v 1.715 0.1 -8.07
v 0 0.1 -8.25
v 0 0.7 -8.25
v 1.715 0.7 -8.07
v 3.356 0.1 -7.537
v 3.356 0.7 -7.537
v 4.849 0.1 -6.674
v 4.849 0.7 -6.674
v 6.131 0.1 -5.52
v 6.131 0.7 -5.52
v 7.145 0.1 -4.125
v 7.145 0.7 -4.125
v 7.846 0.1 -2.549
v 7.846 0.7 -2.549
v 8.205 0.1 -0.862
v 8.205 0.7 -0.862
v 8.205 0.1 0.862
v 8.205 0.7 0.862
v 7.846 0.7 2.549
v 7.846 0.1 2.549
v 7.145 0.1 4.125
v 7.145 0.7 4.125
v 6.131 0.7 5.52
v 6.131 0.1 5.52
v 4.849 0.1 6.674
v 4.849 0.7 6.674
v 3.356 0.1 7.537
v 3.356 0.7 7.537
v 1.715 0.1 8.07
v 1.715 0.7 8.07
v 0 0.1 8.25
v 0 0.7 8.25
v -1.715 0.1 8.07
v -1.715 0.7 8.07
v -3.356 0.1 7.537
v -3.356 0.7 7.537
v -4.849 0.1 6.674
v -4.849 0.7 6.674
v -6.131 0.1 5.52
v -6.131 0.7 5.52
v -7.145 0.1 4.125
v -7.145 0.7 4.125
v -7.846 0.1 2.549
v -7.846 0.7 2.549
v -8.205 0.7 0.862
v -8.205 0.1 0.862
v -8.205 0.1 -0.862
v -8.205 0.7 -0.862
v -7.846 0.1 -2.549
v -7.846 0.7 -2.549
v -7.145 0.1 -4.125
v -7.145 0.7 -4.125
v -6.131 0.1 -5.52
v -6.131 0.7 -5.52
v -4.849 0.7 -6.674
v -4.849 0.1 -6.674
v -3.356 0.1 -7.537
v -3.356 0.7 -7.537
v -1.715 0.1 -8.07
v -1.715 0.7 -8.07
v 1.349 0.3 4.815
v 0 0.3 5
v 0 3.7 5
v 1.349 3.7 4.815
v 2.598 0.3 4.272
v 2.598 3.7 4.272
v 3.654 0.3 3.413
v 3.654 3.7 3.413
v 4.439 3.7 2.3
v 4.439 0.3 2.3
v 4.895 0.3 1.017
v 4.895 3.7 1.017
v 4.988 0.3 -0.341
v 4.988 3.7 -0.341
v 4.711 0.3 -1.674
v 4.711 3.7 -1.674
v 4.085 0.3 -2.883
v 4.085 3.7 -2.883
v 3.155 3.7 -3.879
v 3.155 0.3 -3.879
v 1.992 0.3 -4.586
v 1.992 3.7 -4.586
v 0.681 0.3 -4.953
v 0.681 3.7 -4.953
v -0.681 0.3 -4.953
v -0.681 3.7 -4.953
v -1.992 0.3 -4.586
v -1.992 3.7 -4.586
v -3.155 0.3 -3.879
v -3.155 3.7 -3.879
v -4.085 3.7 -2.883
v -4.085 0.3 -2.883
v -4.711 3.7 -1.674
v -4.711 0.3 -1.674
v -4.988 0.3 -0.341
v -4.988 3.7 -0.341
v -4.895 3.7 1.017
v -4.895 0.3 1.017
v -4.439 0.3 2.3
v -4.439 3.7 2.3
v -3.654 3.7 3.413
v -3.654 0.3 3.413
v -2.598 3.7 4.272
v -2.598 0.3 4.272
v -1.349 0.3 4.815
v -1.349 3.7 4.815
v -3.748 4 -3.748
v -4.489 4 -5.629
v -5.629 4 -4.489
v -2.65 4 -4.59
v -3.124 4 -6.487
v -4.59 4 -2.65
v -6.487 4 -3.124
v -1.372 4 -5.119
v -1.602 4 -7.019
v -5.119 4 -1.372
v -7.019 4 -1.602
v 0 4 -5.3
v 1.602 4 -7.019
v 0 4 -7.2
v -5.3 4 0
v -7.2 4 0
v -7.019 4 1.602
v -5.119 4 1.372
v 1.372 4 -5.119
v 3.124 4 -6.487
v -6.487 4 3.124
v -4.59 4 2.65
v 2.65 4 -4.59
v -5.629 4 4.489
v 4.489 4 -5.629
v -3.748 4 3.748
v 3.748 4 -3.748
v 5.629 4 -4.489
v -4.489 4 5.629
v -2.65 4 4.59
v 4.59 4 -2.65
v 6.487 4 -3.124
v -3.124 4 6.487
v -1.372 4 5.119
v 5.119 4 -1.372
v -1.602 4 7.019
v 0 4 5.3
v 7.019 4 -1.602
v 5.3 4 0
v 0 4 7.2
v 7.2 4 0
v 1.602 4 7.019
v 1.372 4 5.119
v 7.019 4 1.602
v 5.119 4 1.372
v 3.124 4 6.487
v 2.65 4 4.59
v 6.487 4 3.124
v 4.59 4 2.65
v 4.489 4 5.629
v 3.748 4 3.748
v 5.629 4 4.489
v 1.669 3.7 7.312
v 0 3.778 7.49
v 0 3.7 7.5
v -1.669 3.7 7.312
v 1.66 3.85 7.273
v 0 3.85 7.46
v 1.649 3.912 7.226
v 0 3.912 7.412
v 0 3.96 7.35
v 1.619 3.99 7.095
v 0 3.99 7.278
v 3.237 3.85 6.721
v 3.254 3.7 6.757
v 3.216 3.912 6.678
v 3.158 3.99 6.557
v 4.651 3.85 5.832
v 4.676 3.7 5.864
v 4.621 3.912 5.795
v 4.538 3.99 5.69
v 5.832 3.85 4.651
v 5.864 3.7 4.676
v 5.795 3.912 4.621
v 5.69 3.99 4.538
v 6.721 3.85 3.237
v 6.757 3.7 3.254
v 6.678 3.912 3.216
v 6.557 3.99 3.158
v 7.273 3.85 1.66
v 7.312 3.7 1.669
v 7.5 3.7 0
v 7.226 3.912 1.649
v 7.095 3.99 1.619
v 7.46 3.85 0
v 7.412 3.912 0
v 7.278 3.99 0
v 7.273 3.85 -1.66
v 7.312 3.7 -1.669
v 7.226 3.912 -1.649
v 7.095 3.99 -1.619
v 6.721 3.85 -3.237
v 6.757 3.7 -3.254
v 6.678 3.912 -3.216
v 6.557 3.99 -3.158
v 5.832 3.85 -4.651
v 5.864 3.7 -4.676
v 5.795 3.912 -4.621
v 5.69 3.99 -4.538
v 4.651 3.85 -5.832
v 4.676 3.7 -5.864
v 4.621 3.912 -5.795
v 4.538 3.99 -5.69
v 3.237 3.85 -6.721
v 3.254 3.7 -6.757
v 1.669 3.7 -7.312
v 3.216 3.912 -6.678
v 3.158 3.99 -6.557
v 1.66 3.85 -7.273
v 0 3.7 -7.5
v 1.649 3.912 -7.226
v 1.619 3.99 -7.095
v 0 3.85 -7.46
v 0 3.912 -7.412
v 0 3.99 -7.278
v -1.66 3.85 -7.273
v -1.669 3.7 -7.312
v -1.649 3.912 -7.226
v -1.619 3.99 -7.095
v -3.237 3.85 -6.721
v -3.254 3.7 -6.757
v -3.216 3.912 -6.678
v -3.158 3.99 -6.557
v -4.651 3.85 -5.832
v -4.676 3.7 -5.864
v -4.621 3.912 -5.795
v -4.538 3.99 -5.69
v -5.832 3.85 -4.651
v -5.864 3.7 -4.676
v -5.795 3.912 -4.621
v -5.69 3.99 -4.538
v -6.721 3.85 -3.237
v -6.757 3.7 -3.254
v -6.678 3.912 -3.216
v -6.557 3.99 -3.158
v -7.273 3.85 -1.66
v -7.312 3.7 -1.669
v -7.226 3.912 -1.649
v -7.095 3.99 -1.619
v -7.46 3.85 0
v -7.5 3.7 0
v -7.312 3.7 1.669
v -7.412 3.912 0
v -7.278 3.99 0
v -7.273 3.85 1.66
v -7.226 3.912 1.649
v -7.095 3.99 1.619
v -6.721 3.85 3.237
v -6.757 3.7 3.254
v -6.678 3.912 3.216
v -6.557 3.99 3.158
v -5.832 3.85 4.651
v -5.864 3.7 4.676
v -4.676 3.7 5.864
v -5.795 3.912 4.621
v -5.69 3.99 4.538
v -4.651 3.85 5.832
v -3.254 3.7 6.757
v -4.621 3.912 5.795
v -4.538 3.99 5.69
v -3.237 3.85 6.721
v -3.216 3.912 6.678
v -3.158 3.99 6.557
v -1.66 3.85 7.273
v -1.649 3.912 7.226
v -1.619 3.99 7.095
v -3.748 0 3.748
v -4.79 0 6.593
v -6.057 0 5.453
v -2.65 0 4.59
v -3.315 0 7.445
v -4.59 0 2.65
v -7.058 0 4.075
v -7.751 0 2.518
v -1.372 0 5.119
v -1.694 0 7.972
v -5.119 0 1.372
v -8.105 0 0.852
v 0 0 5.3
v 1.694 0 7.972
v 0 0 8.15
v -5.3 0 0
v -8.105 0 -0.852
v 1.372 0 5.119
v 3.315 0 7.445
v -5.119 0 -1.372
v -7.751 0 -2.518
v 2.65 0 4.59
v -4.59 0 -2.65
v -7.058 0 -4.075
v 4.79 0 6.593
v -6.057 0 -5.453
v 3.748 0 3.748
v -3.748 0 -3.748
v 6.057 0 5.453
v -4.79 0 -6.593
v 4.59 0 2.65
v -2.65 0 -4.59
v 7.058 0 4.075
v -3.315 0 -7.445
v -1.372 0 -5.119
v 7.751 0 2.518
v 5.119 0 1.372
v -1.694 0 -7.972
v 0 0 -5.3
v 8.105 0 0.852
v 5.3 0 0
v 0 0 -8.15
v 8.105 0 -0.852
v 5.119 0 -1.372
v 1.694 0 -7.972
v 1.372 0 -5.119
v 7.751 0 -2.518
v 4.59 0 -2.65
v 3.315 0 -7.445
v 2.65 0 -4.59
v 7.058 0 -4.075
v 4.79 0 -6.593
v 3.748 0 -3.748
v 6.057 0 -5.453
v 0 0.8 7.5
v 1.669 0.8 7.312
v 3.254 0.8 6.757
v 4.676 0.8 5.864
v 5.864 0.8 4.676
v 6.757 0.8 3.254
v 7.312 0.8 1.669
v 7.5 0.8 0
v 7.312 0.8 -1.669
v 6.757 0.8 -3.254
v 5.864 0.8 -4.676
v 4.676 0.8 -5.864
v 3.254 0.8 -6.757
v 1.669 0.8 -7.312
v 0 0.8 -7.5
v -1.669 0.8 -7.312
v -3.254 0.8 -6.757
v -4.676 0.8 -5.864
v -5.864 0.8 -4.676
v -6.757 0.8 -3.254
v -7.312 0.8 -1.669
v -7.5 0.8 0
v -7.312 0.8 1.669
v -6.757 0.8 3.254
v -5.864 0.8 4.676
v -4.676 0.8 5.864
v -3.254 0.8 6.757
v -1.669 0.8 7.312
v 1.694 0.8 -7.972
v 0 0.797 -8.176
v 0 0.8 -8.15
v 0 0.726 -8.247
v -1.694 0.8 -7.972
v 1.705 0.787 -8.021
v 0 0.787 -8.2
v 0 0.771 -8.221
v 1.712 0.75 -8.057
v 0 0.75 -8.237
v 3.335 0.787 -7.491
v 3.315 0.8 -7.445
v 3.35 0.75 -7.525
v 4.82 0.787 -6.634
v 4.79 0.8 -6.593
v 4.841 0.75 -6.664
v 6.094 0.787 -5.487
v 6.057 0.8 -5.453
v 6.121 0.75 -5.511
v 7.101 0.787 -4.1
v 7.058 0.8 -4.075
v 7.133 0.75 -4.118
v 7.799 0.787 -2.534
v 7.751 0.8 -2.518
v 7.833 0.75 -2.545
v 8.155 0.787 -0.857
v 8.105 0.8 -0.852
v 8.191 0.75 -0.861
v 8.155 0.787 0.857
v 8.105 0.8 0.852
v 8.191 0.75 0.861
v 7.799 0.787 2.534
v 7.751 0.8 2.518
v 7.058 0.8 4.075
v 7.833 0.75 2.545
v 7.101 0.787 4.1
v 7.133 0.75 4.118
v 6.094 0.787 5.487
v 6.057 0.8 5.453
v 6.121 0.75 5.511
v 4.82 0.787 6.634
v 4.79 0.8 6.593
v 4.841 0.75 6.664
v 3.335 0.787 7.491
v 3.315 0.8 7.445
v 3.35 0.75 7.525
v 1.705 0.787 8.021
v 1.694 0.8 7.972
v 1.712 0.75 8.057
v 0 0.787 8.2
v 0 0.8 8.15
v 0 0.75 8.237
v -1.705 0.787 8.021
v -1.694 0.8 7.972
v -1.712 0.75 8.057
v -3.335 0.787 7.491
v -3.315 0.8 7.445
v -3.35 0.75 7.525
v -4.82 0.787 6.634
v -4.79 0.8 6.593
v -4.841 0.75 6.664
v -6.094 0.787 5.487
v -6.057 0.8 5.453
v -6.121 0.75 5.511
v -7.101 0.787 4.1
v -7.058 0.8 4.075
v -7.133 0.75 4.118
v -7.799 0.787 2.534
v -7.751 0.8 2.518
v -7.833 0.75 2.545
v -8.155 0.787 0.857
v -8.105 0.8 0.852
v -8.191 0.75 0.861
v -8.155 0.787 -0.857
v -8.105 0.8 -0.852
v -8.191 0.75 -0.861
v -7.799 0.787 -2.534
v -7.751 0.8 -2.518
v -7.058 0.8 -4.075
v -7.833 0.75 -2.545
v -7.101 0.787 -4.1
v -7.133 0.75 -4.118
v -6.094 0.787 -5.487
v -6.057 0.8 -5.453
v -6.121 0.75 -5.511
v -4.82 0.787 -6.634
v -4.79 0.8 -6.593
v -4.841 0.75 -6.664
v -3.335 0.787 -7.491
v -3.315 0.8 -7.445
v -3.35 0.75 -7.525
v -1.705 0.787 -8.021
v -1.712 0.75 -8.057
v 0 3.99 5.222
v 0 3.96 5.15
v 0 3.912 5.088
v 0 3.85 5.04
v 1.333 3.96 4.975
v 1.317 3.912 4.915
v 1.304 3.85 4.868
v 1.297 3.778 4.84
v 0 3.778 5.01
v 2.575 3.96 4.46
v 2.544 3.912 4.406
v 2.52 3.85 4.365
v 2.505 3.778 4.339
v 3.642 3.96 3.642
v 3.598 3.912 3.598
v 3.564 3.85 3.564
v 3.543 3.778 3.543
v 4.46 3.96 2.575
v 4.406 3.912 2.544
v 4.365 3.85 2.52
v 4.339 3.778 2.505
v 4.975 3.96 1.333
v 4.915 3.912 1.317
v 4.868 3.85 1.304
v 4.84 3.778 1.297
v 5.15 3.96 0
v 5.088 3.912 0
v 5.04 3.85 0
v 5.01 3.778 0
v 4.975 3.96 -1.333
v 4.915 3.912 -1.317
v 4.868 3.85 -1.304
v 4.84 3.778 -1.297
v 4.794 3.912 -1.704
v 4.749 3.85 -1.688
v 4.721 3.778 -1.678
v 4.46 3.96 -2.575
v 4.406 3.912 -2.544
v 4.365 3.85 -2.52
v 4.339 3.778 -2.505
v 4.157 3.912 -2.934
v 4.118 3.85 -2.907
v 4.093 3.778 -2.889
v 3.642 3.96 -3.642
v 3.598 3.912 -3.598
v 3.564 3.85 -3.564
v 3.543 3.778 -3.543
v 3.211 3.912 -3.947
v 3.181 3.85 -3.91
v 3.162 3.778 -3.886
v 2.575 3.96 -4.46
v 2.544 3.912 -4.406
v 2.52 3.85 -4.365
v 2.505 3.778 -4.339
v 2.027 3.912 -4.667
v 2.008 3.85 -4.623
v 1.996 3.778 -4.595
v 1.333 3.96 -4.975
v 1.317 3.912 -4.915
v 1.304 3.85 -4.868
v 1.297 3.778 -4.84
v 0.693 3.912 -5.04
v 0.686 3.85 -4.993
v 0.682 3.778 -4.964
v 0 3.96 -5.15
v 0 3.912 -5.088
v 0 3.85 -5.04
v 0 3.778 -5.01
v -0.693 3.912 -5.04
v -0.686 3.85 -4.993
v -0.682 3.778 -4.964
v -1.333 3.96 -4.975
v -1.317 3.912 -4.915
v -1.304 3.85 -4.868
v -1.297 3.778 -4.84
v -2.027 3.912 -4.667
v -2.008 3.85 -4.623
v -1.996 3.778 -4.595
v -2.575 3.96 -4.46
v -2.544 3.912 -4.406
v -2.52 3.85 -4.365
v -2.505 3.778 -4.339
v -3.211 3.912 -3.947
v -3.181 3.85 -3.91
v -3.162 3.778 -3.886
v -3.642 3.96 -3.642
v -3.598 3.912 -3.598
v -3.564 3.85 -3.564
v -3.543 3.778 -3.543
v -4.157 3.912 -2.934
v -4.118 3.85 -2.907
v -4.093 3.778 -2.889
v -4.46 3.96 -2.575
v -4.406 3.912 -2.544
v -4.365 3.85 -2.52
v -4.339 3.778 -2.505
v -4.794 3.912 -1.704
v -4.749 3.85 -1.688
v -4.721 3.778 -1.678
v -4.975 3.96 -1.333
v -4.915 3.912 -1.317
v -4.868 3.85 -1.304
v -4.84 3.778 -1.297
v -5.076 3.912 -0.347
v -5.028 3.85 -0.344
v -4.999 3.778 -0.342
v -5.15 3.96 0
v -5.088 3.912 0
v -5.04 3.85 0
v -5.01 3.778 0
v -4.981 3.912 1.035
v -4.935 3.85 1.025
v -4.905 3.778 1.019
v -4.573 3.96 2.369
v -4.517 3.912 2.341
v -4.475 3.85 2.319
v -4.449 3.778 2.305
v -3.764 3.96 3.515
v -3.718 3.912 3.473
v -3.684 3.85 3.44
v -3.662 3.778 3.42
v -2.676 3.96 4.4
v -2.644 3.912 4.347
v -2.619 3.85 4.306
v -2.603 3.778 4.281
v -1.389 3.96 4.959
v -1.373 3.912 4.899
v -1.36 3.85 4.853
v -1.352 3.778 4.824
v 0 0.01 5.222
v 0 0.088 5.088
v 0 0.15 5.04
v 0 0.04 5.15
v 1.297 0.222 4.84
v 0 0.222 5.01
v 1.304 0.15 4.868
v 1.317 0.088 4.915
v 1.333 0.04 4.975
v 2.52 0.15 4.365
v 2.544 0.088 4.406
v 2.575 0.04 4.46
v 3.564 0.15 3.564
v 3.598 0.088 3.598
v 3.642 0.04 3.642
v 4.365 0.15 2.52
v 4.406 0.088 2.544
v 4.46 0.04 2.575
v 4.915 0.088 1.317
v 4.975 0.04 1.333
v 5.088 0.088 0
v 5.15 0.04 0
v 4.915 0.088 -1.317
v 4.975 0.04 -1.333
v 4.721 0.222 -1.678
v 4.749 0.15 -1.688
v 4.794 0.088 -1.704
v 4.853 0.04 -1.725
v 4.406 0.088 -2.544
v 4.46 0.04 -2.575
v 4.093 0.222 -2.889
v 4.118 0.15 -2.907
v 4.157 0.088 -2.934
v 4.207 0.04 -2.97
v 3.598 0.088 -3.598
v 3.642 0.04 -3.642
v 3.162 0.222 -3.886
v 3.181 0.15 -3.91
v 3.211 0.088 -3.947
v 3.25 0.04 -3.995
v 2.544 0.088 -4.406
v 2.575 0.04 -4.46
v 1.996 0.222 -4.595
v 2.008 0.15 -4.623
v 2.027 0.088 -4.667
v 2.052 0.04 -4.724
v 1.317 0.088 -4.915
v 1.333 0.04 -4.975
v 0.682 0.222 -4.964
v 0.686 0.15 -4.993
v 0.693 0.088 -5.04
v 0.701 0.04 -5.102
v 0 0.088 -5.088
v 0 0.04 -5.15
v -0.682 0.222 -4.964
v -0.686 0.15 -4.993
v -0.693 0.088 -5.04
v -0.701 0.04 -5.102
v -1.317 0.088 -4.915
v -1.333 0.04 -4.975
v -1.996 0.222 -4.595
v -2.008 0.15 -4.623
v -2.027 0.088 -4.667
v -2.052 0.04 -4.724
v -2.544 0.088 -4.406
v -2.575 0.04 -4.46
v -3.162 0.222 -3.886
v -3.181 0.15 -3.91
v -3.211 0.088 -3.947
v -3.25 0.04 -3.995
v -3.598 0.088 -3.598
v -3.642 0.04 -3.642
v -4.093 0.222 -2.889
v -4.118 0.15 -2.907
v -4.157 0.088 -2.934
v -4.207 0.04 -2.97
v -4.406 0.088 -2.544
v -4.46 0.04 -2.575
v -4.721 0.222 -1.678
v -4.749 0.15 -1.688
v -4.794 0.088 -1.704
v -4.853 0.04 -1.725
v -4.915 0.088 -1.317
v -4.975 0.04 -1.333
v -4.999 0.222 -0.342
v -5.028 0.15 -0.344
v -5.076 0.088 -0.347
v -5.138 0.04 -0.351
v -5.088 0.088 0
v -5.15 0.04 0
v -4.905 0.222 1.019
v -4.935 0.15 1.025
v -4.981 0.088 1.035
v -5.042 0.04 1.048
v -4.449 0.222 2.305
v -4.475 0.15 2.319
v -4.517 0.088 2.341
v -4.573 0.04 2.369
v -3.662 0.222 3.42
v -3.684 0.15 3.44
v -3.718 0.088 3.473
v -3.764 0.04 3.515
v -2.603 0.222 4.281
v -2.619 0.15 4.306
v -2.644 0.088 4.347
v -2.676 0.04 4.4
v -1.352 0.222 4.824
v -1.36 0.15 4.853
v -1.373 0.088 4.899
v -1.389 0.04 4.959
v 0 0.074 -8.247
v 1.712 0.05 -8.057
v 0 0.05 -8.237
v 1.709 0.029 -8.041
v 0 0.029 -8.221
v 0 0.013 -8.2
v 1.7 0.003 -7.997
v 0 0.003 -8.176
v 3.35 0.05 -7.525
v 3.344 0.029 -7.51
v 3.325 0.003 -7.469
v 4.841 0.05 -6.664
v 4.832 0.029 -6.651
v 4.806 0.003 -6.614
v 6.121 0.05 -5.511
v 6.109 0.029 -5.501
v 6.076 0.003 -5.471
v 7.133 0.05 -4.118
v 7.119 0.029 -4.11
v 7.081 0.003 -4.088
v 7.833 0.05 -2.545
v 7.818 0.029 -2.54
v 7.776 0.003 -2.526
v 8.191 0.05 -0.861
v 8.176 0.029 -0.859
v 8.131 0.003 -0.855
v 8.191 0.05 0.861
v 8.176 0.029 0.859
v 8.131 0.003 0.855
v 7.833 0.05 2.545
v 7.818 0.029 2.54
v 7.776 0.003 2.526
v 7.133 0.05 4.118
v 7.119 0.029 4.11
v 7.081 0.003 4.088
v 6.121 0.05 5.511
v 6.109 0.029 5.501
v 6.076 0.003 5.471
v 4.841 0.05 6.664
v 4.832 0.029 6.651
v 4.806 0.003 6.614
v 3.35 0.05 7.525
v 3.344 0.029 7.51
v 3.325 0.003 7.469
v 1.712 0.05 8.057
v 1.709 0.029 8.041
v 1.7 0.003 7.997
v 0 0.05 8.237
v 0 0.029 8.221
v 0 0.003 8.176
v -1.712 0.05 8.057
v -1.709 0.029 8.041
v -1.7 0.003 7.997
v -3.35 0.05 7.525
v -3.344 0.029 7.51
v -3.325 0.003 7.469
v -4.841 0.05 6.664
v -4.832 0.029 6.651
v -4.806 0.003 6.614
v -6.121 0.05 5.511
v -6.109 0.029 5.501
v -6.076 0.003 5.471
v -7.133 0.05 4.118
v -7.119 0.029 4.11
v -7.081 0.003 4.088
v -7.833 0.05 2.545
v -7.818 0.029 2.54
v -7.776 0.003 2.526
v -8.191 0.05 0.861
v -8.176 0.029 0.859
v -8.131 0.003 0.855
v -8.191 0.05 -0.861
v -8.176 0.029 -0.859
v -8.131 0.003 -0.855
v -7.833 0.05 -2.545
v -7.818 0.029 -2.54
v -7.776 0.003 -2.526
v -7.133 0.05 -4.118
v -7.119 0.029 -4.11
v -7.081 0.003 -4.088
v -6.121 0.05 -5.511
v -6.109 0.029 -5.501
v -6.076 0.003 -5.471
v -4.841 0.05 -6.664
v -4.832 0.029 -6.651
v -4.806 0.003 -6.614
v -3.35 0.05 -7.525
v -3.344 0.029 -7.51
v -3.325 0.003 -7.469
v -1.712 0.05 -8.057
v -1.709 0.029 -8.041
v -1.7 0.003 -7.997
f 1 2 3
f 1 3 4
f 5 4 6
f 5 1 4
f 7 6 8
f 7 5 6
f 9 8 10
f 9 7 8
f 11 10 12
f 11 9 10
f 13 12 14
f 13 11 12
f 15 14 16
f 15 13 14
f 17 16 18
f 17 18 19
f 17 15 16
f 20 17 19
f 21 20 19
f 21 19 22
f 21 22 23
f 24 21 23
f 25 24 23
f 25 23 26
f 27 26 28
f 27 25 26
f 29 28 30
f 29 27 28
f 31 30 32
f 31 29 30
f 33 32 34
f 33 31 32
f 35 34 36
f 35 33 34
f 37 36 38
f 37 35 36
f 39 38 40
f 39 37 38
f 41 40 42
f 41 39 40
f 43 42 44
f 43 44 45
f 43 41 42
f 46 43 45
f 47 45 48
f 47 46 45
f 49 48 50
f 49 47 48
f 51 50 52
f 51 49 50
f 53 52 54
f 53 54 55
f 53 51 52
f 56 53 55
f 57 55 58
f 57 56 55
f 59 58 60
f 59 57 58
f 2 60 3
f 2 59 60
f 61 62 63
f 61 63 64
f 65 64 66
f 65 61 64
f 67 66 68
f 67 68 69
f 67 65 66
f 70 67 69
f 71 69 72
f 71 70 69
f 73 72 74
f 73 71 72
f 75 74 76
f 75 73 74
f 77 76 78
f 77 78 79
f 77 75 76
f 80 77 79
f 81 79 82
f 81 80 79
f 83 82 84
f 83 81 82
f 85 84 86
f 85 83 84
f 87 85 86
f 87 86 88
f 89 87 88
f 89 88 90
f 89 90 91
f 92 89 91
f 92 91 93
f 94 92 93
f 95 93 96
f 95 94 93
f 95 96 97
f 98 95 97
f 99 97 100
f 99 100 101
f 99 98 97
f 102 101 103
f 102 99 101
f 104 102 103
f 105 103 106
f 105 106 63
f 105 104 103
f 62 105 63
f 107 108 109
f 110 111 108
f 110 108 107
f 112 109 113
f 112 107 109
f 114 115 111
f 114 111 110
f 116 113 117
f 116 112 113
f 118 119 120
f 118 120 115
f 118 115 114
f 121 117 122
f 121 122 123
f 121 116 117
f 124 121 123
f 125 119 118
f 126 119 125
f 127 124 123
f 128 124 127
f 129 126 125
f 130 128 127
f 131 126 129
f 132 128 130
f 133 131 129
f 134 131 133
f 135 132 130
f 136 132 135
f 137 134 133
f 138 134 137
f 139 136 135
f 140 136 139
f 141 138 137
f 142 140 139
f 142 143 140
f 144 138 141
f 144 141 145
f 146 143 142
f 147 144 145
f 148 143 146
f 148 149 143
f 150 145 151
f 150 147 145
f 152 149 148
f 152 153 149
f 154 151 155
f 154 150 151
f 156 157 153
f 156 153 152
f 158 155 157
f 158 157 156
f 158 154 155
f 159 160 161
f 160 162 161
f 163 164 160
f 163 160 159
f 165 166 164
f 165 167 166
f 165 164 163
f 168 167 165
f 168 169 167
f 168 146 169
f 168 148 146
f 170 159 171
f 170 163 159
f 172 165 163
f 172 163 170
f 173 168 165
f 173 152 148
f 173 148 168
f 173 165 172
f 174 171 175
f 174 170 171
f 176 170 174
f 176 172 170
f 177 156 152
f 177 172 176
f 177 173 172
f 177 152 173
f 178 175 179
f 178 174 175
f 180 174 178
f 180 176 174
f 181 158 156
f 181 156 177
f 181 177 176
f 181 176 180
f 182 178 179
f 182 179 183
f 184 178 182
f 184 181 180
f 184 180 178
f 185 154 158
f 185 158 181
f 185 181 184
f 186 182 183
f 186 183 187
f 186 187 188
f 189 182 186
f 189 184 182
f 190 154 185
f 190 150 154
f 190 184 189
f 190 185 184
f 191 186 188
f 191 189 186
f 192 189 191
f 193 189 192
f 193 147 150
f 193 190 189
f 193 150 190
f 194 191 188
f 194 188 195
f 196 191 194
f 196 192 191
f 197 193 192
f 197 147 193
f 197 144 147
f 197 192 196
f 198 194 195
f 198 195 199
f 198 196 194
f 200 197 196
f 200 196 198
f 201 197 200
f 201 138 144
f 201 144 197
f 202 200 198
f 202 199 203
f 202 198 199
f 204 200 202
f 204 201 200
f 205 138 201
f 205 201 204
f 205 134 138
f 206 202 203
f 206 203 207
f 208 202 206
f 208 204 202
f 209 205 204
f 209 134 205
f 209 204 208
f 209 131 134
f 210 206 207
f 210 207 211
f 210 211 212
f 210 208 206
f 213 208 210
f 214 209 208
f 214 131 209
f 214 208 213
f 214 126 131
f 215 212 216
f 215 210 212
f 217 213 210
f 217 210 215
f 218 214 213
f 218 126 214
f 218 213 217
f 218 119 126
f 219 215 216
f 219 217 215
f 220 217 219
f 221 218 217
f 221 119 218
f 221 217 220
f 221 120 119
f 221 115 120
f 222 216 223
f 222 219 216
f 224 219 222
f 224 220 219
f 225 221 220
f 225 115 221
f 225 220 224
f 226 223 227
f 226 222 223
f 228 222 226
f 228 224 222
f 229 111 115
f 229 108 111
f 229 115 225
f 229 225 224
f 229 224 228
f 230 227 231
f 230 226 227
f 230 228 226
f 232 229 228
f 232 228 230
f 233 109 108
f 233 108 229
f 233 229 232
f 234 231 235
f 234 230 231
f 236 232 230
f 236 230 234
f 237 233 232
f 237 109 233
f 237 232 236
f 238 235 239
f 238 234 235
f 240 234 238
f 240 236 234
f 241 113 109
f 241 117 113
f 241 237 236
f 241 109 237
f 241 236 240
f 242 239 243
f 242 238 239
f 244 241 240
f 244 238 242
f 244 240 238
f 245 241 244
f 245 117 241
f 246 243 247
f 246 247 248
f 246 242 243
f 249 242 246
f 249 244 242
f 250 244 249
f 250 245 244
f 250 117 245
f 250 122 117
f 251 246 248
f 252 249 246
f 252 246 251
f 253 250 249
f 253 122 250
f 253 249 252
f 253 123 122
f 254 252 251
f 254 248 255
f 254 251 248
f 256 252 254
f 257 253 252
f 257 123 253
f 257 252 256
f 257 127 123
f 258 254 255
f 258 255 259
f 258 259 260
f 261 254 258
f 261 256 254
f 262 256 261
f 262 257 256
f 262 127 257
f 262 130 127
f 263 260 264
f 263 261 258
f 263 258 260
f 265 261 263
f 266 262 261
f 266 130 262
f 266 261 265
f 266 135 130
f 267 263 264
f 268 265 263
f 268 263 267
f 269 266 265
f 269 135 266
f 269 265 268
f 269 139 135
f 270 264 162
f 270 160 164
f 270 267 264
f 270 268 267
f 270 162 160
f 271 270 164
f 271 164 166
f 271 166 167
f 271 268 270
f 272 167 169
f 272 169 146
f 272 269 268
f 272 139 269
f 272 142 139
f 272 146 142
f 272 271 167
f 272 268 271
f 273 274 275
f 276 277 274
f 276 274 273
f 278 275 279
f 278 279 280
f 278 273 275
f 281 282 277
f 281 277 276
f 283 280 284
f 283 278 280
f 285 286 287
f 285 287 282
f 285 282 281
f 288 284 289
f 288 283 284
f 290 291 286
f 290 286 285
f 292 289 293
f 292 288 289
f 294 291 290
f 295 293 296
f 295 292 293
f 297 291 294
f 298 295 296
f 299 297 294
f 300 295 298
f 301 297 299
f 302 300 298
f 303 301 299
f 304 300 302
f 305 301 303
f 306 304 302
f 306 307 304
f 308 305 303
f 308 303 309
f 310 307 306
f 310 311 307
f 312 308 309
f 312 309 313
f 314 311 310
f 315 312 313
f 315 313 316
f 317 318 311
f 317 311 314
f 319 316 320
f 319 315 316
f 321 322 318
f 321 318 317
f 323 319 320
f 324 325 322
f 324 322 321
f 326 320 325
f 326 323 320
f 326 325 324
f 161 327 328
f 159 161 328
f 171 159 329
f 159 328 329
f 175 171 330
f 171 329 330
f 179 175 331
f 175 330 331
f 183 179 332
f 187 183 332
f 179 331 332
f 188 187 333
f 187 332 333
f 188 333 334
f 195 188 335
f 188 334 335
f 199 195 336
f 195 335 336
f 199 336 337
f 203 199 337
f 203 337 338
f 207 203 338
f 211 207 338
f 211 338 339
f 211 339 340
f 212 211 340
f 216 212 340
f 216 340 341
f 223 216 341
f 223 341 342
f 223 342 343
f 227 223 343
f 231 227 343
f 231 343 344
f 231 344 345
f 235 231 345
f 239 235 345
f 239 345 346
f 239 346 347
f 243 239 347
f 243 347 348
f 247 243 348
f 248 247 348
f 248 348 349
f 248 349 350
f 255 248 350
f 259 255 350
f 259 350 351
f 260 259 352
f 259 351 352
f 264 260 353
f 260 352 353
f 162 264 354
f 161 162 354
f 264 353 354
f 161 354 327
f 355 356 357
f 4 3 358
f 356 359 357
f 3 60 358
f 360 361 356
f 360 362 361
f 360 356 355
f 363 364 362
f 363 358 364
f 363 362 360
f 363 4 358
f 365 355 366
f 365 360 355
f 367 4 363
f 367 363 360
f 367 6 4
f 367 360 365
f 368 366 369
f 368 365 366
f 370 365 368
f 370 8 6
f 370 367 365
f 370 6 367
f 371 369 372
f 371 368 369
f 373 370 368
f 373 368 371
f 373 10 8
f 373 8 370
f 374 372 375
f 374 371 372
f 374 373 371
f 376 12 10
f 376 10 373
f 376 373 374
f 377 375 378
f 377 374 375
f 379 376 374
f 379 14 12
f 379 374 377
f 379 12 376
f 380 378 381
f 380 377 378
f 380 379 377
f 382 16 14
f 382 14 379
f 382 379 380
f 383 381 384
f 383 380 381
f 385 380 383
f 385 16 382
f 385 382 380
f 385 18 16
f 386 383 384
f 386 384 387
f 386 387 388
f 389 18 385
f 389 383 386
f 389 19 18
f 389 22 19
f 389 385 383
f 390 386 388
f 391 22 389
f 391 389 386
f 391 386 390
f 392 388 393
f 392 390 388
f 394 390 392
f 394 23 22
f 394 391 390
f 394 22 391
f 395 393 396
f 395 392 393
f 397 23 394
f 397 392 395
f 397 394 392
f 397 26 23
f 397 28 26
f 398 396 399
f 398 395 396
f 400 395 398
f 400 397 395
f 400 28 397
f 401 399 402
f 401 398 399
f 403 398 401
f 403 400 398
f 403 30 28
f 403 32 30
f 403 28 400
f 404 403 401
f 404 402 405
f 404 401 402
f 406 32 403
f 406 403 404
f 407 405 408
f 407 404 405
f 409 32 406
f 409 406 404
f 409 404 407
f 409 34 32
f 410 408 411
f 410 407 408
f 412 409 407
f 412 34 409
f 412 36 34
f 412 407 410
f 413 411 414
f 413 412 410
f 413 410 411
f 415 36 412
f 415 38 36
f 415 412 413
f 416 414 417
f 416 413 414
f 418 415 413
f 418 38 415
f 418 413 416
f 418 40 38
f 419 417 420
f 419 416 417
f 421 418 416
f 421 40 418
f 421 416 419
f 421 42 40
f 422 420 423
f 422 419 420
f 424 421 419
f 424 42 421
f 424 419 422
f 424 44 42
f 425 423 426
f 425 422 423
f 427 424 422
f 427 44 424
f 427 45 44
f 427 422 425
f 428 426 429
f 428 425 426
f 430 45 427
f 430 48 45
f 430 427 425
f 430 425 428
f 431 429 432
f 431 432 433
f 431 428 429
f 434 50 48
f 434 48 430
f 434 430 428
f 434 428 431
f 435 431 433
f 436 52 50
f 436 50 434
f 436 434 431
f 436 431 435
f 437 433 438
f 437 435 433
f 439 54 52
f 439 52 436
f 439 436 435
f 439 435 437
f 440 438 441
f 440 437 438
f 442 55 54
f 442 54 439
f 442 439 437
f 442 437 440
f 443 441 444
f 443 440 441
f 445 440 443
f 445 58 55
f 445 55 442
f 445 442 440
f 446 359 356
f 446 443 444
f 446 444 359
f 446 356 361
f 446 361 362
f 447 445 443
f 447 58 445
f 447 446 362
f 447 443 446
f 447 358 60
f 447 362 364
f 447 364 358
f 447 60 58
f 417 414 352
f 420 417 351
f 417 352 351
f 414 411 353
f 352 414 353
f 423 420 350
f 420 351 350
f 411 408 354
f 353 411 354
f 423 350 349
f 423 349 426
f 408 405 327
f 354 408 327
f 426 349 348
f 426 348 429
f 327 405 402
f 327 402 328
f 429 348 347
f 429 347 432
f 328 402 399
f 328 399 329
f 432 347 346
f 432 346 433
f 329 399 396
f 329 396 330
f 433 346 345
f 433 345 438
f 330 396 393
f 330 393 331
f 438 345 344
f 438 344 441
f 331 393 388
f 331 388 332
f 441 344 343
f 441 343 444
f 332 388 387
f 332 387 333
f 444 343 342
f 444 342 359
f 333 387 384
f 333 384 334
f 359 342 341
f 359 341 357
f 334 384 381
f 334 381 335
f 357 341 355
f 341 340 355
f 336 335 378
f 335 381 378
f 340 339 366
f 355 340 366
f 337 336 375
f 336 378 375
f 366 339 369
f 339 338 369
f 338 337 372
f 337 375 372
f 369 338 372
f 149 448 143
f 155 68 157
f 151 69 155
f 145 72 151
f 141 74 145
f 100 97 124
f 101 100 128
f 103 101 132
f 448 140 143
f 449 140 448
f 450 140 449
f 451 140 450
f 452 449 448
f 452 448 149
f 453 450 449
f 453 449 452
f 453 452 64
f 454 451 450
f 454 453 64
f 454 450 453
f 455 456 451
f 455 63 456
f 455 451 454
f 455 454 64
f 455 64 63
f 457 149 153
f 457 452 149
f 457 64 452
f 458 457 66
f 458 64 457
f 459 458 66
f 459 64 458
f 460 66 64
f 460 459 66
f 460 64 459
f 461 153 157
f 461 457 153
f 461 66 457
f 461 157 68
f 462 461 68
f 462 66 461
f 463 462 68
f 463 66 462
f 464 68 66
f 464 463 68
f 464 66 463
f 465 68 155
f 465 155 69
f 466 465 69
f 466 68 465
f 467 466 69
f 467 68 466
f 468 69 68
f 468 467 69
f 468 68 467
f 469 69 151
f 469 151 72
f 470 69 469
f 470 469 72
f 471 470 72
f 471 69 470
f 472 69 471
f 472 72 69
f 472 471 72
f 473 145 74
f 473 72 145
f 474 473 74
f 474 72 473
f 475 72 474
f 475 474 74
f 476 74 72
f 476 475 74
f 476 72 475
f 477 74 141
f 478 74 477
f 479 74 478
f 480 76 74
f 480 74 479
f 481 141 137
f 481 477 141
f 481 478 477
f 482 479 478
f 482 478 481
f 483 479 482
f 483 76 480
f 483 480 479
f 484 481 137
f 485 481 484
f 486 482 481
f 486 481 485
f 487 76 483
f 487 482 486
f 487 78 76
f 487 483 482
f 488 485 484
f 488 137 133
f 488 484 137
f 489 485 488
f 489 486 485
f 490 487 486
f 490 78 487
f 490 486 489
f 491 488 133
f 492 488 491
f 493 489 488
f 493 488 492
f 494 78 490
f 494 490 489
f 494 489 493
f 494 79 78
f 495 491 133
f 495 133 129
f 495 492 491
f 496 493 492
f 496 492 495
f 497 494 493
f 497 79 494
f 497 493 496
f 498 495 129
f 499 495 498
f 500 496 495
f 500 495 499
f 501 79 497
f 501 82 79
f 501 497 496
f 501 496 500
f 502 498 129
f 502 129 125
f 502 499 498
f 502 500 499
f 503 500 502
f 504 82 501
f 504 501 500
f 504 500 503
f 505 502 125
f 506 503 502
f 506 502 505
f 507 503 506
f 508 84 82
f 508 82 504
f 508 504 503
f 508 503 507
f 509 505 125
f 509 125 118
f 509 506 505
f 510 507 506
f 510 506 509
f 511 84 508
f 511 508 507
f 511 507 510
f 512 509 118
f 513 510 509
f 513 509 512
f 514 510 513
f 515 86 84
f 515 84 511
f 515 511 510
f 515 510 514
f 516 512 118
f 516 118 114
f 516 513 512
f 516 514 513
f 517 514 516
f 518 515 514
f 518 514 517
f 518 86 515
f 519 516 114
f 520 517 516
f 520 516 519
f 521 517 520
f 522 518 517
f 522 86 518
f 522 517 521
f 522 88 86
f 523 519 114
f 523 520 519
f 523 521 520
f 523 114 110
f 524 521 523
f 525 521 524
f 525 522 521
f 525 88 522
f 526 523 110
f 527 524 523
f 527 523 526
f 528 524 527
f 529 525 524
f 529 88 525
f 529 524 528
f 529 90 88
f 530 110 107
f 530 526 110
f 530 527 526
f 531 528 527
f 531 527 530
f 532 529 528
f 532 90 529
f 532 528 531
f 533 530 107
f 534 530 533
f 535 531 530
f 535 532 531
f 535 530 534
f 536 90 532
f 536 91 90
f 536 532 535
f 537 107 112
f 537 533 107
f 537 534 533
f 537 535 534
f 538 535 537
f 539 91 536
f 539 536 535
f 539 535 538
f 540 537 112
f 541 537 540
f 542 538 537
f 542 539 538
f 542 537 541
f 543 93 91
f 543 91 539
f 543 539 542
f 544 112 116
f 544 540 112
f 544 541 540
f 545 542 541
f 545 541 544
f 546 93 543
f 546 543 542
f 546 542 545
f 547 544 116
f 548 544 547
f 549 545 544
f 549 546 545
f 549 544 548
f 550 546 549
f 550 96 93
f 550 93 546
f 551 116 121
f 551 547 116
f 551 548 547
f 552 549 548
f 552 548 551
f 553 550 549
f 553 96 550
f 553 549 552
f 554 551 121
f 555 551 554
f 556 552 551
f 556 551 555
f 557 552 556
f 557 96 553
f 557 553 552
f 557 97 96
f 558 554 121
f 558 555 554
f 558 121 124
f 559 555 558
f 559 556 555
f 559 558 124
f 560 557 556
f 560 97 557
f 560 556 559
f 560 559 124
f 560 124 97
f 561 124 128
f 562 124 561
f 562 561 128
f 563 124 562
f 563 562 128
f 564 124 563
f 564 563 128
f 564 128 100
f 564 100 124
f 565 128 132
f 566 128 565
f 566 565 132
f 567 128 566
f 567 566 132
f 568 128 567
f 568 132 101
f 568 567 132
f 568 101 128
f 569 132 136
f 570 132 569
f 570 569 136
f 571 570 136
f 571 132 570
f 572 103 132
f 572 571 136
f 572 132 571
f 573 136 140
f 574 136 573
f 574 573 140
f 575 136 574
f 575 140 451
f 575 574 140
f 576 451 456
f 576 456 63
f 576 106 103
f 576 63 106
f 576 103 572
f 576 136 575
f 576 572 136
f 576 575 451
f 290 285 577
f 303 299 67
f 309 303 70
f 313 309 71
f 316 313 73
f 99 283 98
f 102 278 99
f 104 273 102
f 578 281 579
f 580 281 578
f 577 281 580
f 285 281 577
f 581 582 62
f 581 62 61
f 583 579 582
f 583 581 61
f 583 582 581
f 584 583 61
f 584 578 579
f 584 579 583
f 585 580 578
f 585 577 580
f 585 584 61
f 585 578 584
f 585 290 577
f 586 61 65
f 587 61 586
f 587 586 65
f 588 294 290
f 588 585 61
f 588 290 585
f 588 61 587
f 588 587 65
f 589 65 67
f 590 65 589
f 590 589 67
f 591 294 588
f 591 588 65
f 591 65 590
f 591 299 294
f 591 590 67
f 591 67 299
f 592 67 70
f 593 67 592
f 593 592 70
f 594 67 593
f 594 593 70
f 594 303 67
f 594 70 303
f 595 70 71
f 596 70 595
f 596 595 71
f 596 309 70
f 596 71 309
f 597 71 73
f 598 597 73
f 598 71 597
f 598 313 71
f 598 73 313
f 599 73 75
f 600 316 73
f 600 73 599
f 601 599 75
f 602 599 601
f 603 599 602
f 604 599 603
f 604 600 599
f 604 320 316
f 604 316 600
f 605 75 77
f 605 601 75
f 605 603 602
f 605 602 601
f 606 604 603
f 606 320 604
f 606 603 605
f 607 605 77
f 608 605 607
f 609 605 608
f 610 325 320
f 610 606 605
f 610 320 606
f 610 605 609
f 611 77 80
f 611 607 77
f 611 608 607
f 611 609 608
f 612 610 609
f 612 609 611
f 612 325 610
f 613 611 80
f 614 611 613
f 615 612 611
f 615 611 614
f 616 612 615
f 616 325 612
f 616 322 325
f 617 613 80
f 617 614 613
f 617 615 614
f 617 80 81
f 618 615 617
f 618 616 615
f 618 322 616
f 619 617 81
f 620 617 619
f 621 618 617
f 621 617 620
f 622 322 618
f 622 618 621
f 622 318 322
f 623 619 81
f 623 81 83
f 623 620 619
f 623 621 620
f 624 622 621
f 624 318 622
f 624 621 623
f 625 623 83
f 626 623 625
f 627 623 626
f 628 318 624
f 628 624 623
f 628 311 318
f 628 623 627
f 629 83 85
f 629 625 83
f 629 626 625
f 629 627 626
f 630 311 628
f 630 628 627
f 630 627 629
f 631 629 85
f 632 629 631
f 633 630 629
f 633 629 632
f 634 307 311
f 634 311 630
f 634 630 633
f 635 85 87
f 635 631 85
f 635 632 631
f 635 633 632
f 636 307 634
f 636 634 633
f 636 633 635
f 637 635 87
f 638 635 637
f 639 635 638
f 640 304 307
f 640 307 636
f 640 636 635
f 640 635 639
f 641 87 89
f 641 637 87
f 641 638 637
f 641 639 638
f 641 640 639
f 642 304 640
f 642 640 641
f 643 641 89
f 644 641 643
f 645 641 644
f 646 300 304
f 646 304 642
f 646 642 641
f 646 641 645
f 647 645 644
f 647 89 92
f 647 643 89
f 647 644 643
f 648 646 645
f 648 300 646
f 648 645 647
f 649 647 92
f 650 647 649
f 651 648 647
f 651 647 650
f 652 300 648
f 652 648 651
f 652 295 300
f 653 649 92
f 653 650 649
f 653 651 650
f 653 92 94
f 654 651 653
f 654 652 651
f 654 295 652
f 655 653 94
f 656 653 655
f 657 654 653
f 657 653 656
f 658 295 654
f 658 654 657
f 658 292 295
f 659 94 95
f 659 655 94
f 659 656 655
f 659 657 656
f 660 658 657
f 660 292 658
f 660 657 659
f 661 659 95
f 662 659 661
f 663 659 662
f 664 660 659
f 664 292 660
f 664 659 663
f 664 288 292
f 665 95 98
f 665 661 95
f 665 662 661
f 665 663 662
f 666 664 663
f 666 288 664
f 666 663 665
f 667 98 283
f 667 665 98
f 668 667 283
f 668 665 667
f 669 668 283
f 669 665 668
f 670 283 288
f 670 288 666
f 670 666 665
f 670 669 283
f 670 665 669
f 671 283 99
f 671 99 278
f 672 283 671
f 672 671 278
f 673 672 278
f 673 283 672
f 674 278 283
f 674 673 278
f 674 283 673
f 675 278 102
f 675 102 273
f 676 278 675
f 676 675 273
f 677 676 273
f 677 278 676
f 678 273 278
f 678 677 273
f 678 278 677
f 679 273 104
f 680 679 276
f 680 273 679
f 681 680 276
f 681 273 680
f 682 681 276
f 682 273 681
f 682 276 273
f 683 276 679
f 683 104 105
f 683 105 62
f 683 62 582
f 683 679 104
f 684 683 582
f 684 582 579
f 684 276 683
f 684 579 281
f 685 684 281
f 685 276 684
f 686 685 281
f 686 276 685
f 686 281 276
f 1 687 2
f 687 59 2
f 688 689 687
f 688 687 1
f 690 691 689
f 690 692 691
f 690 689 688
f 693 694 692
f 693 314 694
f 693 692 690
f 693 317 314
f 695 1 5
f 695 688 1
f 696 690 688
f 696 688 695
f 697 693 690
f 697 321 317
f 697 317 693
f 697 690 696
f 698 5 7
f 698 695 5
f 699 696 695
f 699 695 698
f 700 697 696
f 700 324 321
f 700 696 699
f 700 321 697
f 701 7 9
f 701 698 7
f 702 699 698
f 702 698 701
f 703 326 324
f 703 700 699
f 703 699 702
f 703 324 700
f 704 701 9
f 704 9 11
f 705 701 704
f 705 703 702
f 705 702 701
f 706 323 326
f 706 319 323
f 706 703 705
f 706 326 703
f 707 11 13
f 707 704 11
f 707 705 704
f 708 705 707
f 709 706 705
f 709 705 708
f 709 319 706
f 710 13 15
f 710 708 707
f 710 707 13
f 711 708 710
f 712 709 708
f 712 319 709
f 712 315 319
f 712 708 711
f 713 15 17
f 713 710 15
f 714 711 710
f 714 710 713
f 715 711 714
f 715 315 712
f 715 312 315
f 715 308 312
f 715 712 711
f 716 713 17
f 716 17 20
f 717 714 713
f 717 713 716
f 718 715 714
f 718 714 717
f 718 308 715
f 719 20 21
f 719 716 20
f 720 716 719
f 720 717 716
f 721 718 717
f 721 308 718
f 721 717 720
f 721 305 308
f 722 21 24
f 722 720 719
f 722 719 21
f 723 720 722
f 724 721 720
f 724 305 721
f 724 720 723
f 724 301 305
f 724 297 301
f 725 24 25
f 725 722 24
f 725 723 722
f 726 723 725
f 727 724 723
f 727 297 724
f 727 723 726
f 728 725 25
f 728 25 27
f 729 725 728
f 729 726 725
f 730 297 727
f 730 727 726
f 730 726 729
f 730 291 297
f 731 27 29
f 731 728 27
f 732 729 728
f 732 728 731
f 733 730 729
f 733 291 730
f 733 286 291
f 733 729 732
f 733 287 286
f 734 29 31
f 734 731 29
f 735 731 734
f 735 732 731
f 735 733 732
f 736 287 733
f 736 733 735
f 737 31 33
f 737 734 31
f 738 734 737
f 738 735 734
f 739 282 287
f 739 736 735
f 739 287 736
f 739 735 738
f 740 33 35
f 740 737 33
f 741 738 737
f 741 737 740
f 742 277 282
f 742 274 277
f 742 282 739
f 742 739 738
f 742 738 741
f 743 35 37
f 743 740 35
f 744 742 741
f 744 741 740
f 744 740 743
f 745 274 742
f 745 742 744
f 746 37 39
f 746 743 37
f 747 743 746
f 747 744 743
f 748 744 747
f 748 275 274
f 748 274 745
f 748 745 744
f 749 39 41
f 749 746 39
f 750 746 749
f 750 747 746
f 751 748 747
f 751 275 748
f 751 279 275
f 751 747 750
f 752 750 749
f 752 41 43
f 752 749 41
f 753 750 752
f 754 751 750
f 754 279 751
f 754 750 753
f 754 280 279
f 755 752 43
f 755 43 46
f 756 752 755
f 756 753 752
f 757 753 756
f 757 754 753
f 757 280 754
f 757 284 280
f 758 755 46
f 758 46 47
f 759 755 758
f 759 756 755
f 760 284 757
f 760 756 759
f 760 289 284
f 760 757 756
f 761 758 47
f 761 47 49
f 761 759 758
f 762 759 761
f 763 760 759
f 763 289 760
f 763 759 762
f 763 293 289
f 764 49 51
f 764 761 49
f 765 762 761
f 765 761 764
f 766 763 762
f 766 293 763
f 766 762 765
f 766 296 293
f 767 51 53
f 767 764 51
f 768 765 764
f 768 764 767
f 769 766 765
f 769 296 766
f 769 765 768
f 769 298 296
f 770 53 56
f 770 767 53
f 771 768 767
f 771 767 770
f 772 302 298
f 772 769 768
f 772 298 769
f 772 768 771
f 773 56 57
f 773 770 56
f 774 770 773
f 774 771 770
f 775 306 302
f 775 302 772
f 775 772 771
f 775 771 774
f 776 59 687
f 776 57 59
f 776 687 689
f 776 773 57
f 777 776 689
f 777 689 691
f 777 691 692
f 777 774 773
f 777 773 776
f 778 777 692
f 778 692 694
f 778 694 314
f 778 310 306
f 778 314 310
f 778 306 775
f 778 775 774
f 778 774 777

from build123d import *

# Parameters (mm, degrees)
SKETCH1_R           = 7.5
SKETCH1_R_2         = 5
BOSS_EXTRUDE1_DEPTH = 4
SKETCH2_R           = 8.25
SKETCH2_R_2         = 5
BOSS_EXTRUDE2_DEPTH = 0.8
FILLET1_R           = 0.3
FILLET2_R           = 0.1


with BuildPart() as part:
    # Sketch1 → Boss-Extrude1 (new body)
    with BuildSketch(Plane(origin=(0, 0, 0), x_dir=(1, 0, 0), z_dir=(0, 1, 0))):
        with Locations(Location((0, 0, 0), (0, 0, 270))):
            Circle(SKETCH1_R)
        with Locations(Location((0, 0, 0), (0, 0, 270))):
            Circle(SKETCH1_R_2, mode=Mode.SUBTRACT)
    extrude(amount=BOSS_EXTRUDE1_DEPTH)

    # Sketch2 → Boss-Extrude2 (add)
    with BuildSketch(Plane.XZ):
        with Locations(Location((0, 0, 0), (0, 0, 270))):
            Circle(SKETCH2_R)
        with Locations(Location((0, 0, 0), (0, 0, 90))):
            Circle(SKETCH2_R_2, mode=Mode.SUBTRACT)
    extrude(amount=-BOSS_EXTRUDE2_DEPTH)

    # Fillet1
    fillet1_edges = [part.edges().sort_by_distance(p)[0] for p in [
        (0, 4, -7.5),
        (0, 0, -5),
        (0, 4, -5),
    ]]
    fillet(fillet1_edges, radius=FILLET1_R)

    # Fillet2
    fillet2_edges = [part.edges().sort_by_distance(p)[0] for p in [
        (0, 0, 8.25),
        (0, 0.8, 8.25),
    ]]
    fillet(fillet2_edges, radius=FILLET2_R)


solid = part.part
